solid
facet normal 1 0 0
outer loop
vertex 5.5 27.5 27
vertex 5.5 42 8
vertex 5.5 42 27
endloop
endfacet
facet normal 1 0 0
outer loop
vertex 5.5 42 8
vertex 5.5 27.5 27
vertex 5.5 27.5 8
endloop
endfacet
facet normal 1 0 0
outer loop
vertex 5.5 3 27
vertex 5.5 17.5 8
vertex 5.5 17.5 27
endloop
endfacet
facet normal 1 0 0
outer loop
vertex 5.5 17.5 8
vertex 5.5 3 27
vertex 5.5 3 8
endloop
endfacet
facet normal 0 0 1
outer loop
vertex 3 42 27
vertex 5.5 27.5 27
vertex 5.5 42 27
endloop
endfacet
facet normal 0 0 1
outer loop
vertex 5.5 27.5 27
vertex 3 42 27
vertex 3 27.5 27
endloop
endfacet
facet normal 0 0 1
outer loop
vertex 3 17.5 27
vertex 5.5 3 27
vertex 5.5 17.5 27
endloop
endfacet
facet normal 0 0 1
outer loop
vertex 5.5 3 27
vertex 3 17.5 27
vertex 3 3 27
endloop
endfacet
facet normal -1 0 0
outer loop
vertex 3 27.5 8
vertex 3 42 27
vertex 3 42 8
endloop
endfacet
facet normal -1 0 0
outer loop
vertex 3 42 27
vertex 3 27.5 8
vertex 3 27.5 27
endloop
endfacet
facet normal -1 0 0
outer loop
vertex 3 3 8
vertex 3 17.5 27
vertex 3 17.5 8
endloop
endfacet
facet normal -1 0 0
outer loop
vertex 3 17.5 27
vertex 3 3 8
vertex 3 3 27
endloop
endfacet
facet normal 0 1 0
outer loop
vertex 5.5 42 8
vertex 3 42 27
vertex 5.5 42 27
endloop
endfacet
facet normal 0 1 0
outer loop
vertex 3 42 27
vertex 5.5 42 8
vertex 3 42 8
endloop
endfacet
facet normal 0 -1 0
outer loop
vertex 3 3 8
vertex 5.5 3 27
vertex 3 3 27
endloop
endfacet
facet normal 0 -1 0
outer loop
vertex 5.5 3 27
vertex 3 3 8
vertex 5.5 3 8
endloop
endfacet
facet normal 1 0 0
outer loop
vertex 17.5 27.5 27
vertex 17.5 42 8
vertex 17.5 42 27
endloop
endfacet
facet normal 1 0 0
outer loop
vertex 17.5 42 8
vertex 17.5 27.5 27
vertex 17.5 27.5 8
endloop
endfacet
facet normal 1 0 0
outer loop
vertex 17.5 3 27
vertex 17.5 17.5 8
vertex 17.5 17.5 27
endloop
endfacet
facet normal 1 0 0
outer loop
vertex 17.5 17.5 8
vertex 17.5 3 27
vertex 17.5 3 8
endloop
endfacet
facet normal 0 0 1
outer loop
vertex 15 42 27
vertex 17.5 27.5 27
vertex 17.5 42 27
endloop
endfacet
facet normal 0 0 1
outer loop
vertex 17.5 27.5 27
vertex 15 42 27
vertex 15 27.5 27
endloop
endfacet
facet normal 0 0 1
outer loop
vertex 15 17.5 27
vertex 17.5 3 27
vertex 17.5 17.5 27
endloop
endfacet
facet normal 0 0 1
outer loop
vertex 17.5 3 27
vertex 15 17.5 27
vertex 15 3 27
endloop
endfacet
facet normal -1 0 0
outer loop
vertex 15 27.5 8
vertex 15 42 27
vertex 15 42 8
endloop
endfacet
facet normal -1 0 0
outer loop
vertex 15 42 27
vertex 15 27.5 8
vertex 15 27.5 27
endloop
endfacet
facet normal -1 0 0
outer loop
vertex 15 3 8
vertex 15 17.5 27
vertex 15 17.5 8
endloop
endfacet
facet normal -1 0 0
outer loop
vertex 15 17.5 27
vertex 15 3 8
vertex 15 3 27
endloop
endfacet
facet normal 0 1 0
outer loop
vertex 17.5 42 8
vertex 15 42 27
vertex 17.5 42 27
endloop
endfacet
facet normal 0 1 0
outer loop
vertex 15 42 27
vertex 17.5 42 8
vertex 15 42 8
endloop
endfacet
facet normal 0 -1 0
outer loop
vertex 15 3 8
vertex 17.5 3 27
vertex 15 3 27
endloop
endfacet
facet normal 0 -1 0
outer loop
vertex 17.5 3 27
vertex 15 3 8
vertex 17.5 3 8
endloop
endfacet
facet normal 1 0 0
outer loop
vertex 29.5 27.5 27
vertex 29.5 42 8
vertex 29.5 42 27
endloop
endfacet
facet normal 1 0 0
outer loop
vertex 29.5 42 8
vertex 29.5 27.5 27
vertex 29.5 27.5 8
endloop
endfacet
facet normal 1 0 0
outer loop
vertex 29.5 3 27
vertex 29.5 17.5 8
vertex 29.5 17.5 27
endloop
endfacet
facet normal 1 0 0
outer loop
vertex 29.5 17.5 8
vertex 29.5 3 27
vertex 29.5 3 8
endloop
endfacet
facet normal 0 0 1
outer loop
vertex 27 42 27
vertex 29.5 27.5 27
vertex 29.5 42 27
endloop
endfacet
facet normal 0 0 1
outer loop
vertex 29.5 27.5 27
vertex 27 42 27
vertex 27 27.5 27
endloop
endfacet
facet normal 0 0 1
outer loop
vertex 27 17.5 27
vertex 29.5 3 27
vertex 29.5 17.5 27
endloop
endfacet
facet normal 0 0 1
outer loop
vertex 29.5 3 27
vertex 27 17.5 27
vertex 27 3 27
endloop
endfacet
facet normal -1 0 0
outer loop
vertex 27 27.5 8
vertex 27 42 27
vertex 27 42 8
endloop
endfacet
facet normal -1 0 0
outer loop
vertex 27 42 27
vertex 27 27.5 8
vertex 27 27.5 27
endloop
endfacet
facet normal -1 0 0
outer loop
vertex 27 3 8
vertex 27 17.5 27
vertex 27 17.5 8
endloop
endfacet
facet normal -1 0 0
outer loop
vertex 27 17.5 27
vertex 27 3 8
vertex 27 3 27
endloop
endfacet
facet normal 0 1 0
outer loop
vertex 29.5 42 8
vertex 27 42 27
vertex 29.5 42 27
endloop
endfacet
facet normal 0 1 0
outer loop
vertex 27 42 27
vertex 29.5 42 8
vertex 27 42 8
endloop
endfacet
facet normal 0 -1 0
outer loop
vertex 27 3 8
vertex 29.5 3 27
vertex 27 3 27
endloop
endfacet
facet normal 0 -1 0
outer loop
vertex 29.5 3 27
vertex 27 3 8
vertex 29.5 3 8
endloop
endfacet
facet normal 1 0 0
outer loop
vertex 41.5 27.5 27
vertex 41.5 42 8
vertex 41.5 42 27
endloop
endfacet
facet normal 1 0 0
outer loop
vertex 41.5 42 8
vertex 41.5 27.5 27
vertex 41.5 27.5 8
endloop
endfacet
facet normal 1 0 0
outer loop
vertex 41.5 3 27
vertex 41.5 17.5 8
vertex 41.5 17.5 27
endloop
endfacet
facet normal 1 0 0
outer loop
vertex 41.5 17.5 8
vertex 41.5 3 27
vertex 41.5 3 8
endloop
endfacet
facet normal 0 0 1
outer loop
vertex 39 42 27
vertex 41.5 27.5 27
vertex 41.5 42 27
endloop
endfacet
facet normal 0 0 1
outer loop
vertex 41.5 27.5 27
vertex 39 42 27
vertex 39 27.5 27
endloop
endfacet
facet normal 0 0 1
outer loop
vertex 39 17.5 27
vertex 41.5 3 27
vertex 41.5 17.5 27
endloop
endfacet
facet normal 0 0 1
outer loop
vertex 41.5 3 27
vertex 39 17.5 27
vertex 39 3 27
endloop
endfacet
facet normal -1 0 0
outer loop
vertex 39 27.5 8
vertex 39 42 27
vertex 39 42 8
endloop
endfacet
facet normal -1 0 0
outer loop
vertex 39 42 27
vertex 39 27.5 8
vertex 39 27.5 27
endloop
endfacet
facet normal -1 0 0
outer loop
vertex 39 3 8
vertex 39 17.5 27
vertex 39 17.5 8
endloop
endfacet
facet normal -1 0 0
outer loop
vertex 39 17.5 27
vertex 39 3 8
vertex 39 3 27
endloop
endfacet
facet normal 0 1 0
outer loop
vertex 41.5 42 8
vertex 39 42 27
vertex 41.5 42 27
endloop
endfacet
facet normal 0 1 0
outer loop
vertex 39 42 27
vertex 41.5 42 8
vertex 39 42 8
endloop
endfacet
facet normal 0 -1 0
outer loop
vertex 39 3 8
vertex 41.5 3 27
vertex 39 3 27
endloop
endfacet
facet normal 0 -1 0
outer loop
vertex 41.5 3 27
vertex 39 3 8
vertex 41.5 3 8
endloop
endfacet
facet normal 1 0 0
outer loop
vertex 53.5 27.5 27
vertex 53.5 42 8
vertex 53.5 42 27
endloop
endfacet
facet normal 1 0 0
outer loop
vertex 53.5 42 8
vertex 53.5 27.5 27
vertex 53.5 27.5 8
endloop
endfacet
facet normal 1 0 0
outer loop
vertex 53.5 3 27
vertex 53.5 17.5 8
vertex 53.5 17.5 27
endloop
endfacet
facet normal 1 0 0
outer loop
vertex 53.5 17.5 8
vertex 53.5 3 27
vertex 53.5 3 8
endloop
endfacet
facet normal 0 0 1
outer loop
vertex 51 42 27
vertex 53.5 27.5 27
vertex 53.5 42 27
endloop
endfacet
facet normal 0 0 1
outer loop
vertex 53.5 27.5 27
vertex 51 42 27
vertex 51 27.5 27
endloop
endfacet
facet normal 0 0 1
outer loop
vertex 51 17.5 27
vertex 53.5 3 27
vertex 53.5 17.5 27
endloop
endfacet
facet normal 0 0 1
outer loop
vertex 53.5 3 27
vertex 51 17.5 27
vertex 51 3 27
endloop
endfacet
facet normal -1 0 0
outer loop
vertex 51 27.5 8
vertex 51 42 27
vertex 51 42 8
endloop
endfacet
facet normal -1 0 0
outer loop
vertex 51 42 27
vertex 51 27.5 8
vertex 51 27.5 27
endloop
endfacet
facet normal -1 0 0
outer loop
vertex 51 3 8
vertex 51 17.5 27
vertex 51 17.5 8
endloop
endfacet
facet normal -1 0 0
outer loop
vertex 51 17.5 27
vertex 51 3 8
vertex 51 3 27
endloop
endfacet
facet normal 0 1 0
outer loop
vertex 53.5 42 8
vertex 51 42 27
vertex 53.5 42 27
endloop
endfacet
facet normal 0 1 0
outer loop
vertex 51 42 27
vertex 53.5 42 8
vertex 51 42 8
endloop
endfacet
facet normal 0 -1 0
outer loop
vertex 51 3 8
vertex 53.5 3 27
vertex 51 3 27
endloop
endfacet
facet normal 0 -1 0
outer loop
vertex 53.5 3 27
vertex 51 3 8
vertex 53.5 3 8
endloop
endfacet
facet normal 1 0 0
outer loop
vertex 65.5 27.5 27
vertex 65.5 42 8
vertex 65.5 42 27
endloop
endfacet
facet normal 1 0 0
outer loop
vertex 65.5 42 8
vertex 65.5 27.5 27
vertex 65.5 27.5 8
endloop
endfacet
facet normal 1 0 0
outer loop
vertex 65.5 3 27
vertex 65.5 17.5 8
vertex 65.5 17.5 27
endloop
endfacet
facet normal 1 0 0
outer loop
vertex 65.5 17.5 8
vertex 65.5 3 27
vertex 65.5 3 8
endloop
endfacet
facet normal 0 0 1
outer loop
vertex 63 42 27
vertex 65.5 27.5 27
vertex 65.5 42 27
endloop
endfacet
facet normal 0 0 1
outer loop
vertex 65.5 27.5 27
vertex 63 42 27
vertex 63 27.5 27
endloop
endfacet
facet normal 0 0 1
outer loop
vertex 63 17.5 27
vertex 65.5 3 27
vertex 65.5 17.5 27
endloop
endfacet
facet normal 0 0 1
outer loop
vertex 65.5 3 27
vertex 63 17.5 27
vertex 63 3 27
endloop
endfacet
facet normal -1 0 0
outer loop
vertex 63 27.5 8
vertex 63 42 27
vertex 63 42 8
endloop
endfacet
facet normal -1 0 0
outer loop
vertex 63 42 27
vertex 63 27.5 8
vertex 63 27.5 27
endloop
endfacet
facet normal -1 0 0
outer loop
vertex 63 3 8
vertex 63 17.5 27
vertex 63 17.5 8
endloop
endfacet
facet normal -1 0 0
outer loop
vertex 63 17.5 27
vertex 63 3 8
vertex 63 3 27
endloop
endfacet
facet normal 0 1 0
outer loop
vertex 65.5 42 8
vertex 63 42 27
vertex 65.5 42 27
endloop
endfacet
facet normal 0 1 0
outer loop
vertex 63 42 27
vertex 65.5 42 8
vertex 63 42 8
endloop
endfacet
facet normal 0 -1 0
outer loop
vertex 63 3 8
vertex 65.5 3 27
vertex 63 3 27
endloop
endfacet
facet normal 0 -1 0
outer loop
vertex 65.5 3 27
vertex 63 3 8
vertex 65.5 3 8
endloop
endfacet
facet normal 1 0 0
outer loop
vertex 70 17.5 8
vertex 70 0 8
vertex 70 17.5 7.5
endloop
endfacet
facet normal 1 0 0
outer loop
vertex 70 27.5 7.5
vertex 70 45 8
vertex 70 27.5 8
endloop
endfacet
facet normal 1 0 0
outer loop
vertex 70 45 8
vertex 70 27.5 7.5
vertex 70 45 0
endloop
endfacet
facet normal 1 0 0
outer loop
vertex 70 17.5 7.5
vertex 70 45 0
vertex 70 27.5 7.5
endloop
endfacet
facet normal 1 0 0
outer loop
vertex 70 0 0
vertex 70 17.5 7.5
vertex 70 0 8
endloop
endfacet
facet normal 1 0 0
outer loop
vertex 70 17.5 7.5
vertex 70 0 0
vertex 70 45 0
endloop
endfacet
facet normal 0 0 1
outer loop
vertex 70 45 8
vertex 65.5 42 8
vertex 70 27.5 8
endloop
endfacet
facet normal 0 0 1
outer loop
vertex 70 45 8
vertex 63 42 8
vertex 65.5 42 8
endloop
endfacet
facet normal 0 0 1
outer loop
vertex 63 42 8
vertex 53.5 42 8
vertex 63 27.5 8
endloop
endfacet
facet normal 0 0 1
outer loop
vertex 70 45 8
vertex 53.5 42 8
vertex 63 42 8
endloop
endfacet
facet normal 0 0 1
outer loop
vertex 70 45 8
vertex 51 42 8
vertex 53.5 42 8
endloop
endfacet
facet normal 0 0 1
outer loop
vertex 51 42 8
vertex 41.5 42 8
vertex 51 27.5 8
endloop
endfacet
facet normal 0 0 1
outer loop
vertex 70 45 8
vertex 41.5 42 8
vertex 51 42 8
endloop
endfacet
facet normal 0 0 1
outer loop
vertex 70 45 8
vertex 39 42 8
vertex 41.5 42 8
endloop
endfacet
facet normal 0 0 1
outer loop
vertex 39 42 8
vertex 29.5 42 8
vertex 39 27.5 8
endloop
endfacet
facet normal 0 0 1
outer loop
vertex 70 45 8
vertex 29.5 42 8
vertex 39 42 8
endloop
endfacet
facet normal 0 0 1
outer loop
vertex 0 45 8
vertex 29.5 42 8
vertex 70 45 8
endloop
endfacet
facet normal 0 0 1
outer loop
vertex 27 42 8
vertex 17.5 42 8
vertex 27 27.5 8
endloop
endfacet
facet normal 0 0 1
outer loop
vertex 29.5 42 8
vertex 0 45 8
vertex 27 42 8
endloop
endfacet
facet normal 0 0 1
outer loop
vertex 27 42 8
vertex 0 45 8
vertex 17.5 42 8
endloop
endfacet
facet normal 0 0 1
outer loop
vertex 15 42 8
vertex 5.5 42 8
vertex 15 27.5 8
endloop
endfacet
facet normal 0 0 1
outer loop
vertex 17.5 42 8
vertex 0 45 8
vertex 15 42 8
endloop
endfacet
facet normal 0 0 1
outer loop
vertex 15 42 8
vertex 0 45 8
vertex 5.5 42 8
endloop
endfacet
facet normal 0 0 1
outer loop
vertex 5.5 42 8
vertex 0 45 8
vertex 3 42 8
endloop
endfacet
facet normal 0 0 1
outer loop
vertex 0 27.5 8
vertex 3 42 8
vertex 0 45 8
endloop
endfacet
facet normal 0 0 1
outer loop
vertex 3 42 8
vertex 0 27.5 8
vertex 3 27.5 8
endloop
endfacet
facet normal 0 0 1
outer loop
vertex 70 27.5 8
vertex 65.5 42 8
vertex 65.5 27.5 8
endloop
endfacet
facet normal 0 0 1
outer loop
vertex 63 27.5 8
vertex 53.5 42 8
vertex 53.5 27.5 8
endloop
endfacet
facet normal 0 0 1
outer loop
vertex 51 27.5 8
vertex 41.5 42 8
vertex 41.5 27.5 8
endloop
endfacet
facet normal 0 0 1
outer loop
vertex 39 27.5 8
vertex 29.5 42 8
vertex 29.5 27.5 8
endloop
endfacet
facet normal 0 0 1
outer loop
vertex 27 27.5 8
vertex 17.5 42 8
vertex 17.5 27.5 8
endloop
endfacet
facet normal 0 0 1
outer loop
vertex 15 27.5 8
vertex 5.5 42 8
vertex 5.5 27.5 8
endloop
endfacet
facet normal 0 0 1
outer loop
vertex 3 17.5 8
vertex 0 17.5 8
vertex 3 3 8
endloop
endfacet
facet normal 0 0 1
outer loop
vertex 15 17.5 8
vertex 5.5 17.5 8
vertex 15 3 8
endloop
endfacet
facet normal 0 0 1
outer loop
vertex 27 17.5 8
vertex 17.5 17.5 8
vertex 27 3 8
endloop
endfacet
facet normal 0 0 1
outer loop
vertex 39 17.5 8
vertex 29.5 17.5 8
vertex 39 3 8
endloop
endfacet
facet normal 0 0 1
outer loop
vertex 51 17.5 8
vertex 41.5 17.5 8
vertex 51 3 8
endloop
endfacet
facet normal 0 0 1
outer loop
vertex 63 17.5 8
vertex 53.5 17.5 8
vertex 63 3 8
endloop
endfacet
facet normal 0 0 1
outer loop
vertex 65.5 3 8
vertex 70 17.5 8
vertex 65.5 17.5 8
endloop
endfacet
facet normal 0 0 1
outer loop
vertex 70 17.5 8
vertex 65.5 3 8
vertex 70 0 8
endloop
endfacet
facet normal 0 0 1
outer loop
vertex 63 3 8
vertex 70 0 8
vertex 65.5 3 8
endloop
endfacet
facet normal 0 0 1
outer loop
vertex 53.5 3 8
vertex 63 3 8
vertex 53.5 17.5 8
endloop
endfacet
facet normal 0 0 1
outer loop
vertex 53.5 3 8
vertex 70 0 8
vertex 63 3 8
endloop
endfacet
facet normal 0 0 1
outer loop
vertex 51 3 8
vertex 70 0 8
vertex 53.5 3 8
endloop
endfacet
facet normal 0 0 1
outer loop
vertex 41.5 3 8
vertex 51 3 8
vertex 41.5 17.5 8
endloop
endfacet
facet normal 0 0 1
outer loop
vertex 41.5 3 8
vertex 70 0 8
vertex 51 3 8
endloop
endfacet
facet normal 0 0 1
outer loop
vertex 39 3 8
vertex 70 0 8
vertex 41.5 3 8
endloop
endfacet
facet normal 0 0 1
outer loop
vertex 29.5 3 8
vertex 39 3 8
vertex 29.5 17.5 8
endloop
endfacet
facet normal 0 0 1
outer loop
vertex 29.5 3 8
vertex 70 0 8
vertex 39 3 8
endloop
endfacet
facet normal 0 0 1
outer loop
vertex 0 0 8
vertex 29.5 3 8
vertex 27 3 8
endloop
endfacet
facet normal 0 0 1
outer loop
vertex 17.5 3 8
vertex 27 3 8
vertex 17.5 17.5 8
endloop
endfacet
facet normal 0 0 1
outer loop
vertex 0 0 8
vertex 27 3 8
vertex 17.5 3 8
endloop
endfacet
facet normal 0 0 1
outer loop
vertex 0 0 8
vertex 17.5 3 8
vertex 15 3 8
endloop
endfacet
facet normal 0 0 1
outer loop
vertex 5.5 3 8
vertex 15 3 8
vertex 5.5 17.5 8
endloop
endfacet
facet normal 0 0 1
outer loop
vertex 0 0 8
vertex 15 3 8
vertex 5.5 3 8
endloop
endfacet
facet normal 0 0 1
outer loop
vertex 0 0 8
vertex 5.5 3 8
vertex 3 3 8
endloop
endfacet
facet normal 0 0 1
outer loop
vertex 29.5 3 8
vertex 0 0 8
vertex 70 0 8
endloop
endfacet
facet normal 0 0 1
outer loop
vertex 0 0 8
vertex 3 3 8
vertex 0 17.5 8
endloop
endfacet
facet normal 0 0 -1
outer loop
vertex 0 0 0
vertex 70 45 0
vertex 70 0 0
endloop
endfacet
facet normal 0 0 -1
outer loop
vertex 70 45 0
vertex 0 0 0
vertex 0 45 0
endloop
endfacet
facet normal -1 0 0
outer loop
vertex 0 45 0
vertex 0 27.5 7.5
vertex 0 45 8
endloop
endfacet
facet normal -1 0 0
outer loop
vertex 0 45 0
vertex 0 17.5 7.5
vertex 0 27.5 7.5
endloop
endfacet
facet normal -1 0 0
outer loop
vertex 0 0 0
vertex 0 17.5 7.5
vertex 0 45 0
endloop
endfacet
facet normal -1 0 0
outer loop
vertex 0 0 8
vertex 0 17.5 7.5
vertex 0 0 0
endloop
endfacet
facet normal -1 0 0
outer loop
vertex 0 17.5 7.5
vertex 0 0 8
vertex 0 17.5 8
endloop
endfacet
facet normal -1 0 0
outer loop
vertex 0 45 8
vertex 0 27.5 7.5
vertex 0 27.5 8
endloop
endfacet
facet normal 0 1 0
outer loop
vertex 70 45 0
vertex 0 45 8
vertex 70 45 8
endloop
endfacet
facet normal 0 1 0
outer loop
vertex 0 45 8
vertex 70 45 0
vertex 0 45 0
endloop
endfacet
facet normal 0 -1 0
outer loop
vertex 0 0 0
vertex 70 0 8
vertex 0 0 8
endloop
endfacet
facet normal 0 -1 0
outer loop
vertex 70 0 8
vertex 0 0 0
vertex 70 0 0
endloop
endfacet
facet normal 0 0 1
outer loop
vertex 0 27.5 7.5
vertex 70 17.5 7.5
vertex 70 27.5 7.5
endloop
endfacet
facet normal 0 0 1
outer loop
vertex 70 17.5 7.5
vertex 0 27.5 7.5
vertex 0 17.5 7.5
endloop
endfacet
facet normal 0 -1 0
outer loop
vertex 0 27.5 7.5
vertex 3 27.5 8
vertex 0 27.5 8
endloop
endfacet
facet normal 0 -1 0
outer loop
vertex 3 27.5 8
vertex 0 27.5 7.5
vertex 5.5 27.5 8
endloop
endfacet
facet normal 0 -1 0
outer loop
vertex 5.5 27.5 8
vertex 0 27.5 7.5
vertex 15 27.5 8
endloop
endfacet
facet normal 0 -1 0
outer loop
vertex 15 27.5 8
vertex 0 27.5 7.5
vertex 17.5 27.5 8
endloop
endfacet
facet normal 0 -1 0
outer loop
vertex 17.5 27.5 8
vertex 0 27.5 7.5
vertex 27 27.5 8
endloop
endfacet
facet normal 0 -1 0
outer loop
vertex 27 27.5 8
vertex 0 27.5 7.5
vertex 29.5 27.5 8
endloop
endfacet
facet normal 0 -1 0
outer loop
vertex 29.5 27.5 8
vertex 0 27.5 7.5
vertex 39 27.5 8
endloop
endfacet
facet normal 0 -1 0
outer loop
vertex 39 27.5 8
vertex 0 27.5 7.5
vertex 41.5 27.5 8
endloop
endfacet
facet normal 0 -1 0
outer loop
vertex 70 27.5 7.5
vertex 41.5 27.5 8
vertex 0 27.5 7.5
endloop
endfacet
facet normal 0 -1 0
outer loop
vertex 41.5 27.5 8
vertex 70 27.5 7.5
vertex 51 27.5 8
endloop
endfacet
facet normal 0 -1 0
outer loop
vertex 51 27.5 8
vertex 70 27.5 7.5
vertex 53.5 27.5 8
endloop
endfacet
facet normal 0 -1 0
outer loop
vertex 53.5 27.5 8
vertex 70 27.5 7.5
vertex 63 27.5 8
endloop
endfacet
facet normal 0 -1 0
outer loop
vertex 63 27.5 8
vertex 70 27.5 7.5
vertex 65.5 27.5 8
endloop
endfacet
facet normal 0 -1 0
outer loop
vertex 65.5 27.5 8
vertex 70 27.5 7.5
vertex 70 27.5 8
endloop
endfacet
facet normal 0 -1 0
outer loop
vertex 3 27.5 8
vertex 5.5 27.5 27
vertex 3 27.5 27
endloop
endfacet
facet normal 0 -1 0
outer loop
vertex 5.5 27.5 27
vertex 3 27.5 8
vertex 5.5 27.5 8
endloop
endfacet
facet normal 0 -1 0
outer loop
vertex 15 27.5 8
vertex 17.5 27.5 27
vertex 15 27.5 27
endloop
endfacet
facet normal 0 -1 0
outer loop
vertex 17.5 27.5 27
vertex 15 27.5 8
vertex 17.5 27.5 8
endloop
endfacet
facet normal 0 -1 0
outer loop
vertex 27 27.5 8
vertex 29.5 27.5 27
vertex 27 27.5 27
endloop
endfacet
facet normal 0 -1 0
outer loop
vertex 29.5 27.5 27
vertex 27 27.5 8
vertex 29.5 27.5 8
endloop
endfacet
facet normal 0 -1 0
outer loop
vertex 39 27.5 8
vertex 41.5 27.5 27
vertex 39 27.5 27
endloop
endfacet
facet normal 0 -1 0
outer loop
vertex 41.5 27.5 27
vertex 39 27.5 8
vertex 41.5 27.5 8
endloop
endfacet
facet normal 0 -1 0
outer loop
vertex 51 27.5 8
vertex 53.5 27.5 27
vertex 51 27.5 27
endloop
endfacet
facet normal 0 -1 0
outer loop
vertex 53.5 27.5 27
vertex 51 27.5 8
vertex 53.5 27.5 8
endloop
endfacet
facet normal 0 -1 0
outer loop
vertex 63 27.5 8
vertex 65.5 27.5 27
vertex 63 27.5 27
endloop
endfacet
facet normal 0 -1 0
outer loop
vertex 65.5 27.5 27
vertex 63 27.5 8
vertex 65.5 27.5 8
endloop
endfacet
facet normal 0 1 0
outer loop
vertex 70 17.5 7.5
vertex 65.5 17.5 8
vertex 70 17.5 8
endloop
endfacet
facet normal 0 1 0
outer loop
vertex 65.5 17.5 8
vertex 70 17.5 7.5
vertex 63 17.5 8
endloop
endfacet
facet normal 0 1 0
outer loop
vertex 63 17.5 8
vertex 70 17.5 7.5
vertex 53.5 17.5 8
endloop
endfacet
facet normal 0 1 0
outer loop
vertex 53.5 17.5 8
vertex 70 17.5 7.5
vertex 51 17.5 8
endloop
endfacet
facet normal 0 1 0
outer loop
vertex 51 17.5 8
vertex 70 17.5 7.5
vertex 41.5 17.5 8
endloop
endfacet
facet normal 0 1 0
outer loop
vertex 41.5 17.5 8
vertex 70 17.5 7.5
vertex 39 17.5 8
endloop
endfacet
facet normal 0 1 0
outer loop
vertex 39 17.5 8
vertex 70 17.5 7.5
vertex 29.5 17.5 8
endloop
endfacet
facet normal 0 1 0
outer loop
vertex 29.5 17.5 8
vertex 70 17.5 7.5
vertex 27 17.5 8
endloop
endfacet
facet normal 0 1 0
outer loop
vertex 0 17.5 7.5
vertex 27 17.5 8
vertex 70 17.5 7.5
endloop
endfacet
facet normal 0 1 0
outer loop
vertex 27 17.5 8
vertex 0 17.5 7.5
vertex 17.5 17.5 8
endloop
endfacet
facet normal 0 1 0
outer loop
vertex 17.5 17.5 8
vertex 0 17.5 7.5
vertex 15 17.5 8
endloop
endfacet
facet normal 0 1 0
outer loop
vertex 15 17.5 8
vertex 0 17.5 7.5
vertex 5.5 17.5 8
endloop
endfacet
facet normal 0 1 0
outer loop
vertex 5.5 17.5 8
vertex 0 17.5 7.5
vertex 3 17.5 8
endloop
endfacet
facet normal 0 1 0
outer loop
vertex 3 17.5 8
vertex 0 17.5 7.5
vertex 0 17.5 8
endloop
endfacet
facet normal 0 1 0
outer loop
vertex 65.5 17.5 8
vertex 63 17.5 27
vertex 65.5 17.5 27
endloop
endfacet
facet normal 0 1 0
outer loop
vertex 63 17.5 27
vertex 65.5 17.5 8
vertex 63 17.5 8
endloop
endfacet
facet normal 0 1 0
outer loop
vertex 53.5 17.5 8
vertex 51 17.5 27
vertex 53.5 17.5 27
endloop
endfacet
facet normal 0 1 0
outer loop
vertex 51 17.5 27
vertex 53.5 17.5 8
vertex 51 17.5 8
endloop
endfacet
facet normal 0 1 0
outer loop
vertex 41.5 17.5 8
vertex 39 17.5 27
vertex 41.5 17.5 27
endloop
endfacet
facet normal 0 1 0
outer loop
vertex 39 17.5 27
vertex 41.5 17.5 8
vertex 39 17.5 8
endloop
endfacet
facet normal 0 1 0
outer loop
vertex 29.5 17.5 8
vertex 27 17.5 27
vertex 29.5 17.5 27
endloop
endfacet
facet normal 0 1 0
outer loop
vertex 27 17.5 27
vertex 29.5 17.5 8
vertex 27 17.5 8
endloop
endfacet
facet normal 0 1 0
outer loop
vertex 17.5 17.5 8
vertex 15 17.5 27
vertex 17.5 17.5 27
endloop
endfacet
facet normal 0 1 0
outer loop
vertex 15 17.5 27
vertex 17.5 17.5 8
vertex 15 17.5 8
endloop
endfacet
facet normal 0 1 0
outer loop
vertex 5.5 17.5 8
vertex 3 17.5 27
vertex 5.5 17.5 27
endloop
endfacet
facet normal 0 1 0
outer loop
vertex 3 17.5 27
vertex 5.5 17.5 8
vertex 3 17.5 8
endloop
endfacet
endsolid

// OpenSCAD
$fn = 32;

// ----------------------------------------------------------------------
// Heatsink: slotted fin block
// ----------------------------------------------------------------------

// --- parameters (mm) ---
base_l = 70;              // base length, X
base_w = 45;              // base width, Y
base_t = 8;               // base plate thickness
fin_h = 20;               // fin height above the base
fin_t = 2.5;              // fin thickness
edge = 3;                 // margin from the base ends
pitch = 12;               // fin pitch
slot_w = 10;              // central slot width, Y

n_fins = floor((base_l - 2 * edge - fin_t) / pitch) + 1;  // fin count
total_h = base_t + fin_h - 1;  // overall height

difference() {
union() {
  cube([base_l, base_w, base_t]);
  for (i = [0 : n_fins - 1])
    translate([edge + i * pitch, edge, base_t - 1])
      cube([fin_t, base_w - 2 * edge, fin_h]);
}
  translate([-1, base_w / 2 - slot_w / 2, base_t - 0.5])
    cube([base_l + 2, slot_w, fin_h + 2]);
}
